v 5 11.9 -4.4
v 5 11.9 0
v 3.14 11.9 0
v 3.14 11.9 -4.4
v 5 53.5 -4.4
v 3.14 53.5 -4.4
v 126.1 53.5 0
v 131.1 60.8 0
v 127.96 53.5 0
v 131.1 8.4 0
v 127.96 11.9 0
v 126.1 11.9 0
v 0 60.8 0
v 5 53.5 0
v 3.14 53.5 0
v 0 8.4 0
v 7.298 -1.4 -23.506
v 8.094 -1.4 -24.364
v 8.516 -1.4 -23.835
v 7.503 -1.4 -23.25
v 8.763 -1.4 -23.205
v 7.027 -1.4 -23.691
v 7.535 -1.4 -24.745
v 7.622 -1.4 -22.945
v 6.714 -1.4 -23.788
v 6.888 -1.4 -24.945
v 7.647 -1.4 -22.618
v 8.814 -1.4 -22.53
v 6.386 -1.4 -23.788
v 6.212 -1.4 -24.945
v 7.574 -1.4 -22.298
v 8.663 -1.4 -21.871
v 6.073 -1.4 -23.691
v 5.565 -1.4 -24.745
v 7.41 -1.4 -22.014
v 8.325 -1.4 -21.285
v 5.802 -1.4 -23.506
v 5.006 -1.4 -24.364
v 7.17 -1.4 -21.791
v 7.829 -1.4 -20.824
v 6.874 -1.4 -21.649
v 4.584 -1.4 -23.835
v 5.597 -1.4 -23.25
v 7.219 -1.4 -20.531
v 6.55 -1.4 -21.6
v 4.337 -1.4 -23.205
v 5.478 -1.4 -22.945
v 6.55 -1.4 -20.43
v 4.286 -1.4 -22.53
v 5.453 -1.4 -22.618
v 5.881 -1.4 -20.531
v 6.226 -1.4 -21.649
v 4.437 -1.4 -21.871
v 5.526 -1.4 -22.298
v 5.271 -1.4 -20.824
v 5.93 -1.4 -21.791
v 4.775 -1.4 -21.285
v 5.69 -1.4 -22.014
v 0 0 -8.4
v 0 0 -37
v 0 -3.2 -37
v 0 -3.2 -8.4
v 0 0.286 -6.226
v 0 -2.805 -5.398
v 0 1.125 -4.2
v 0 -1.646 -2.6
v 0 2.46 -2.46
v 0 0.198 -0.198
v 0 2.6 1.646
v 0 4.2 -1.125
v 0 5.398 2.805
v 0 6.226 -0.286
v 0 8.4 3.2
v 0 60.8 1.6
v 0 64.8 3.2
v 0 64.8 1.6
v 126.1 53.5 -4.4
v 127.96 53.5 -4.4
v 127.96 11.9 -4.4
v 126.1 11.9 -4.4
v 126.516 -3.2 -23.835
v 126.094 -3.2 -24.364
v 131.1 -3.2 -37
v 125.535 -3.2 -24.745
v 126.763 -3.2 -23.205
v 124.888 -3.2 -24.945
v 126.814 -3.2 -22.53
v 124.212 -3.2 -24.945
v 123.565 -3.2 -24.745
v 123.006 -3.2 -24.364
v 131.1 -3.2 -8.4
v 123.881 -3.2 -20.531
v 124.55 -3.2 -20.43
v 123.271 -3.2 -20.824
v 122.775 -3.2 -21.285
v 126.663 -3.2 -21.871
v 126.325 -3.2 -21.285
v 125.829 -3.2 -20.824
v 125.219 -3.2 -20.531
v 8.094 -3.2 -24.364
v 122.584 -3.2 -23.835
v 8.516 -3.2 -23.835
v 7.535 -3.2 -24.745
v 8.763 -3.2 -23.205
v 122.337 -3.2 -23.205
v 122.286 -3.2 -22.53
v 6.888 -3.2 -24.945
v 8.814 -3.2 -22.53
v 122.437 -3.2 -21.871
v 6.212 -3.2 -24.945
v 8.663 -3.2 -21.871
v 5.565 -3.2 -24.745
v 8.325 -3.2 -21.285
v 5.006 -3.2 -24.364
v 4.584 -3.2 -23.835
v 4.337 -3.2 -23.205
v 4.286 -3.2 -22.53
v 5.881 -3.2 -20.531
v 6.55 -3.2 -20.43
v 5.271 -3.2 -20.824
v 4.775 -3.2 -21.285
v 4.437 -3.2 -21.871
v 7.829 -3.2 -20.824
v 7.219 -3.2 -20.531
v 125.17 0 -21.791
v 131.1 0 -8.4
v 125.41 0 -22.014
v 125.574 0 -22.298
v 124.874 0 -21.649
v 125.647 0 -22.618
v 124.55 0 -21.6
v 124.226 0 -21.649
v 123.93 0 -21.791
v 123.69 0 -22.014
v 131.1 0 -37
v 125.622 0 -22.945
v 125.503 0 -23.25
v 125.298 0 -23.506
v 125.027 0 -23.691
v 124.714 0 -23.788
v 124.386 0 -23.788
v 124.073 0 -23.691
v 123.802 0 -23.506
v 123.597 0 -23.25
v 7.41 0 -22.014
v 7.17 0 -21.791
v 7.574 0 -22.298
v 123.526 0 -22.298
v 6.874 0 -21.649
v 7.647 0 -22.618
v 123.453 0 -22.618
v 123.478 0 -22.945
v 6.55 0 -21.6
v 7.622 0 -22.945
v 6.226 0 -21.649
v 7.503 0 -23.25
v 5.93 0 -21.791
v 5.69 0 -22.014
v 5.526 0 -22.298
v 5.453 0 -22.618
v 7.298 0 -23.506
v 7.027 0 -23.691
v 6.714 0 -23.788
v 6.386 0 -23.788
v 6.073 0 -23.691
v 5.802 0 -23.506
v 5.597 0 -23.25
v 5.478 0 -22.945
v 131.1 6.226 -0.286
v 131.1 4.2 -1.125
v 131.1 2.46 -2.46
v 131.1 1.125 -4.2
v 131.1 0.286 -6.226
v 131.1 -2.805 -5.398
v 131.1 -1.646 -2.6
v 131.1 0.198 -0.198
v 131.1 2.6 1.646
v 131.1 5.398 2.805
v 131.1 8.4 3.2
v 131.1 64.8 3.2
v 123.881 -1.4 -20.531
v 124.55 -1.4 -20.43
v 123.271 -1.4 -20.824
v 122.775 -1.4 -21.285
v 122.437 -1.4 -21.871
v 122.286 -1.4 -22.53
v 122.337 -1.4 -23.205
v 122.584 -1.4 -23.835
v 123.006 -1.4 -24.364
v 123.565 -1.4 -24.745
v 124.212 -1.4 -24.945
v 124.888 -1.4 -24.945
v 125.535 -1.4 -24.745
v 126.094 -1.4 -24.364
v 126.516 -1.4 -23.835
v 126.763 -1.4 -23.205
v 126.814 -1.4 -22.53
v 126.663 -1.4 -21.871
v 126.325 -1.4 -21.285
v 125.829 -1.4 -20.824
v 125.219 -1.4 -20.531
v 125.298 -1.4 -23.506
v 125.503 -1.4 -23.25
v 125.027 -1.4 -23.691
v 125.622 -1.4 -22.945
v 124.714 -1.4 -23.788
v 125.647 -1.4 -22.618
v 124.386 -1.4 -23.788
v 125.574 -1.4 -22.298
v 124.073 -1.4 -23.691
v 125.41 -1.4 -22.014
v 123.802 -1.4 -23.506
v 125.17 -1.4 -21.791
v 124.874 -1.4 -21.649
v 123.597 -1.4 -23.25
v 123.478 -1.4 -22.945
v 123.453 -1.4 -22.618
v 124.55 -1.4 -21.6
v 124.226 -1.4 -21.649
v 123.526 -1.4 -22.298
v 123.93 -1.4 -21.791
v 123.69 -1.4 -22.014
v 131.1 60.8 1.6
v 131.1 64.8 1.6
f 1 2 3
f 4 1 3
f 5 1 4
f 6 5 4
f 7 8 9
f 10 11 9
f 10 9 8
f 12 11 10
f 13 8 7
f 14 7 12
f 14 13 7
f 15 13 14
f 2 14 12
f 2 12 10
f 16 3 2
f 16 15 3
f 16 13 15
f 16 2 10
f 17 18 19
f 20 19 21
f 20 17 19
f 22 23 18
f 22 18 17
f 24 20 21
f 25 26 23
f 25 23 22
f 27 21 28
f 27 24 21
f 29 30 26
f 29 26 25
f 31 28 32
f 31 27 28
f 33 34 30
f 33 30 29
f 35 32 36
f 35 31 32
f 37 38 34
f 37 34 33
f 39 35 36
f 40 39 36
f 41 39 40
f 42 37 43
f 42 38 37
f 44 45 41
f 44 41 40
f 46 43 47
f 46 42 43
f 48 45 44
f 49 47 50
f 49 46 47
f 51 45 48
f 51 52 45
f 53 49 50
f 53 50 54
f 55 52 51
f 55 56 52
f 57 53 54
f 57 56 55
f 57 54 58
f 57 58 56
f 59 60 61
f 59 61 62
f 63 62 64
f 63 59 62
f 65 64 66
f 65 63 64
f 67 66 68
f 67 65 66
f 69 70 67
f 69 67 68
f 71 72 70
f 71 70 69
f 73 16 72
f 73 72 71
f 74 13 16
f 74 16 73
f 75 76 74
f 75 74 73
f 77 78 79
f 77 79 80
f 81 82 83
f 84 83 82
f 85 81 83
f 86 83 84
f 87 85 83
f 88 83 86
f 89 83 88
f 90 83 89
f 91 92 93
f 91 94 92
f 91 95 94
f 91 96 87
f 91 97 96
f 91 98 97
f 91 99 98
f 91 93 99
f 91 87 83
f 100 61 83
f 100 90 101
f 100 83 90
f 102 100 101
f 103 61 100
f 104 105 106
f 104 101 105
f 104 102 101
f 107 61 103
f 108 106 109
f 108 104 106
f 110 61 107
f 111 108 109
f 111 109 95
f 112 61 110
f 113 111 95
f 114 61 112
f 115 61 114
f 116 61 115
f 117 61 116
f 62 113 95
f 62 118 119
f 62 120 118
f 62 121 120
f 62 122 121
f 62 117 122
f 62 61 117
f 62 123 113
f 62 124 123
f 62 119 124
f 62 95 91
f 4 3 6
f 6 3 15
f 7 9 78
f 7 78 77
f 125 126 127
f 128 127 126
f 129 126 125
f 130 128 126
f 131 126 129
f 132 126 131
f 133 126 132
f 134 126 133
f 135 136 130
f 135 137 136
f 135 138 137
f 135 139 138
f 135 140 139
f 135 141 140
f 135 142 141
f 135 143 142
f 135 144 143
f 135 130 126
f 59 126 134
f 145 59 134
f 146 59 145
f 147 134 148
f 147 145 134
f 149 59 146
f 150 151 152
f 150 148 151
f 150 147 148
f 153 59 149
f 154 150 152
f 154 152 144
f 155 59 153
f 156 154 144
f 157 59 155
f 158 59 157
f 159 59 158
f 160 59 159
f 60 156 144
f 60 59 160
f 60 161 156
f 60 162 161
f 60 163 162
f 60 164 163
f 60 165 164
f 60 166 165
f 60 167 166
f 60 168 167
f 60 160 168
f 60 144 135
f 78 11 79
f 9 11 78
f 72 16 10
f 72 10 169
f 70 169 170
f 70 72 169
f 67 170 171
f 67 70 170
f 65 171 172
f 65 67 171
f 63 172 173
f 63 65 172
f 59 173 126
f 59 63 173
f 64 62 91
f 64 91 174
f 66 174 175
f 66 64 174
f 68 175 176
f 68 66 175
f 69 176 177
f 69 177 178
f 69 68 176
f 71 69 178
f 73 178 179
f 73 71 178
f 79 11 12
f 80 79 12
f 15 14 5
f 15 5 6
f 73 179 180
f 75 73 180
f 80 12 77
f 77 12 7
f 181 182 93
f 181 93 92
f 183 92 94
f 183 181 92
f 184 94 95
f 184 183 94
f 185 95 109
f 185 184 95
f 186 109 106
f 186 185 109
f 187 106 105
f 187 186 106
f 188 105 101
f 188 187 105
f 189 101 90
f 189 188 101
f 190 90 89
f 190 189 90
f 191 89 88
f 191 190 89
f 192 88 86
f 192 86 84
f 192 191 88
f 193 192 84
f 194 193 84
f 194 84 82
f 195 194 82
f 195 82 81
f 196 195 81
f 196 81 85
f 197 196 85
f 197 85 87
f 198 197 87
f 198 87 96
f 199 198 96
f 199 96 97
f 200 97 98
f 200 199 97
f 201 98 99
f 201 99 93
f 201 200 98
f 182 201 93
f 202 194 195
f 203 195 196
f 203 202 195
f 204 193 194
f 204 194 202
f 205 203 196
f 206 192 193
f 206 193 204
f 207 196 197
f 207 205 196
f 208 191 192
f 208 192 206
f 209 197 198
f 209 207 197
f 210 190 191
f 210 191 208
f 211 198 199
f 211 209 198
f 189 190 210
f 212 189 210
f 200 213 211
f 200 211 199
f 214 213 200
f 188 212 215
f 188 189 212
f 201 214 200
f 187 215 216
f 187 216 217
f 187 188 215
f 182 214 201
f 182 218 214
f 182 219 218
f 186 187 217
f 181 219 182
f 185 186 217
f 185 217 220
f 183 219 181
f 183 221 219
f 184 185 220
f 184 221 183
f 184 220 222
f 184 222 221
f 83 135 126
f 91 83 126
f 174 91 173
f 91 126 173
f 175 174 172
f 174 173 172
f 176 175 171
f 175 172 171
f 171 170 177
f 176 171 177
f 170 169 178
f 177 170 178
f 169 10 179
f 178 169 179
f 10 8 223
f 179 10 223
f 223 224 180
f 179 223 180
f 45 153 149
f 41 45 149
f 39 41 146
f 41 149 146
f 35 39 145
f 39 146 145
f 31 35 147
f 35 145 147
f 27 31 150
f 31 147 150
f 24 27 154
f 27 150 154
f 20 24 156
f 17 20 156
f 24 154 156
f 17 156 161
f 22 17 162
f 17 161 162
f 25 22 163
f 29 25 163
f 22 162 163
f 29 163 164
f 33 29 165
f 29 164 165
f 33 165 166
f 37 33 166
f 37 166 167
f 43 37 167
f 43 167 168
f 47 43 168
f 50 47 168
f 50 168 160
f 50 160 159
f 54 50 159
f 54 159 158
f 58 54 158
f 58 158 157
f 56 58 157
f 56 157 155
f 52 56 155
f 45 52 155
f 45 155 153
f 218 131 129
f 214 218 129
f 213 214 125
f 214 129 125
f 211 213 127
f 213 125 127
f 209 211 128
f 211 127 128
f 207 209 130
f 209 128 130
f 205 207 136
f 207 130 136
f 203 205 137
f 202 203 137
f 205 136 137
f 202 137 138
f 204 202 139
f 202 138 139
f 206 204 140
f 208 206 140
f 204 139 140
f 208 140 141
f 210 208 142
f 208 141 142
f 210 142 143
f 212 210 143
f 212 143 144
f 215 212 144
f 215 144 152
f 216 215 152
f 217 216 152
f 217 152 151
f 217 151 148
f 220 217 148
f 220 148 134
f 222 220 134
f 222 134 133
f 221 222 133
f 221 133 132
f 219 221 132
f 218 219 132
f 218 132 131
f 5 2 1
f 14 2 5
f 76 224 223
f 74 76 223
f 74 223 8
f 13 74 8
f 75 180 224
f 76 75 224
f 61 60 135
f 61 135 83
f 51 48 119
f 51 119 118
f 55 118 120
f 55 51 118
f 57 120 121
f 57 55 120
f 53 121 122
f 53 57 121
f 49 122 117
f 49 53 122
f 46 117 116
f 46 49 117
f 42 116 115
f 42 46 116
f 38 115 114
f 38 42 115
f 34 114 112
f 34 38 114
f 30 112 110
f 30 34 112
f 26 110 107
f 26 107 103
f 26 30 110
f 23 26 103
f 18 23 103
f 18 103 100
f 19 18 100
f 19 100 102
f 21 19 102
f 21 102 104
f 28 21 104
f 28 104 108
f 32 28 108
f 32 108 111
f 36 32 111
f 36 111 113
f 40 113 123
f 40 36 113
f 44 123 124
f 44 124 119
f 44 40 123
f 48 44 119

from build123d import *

# Parameters (mm, degrees)
SALIENTE_EXTRUIR1_DEPTH    = 131.1
CROQUIS3_R                 = 1.1
CORTAR_EXTRUIR1_DEPTH      = 289.575068223
CROQUIS4_R                 = 10.7
CROQUIS4_R_2               = 5.07
CROQUIS4_W                 = 121.1
CROQUIS4_H                 = 75.8
CROQUIS4_W_2               = 1.6
CROQUIS4_H_2               = 10
CROQUIS4_W_3               = 10
CROQUIS4_H_3               = 10.6
CORTAR_EXTRUIR2_DEPTH      = 287.189954401
CROQUIS7_W                 = 1.36
CROQUIS7_H                 = 98
CROQUIS7_W_2               = 1.86
CROQUIS7_H_2               = 41.6
SALIENTE_EXTRUIR2_DEPTH    = 4.4
CROQUIS8_R                 = 2.27
CORTAR_EXTRUIR3_DEPTH      = 1.8
CORTAR_EXTRUIR4_START      = -1.8
CROQUIS9_R                 = 2.27
CORTAR_EXTRUIR4_DEPTH      = 1.8
CROQUIS10_R                = 11.9
CROQUIS10_R_2              = 10.7
CROQUIS10_W                = 12.4
CROQUIS10_H                = 13
CROQUIS10_W_2              = 10
CROQUIS10_H_2              = 10.6
SALIENTE_EXTRUIR4_DEPTH    = 8.6
REDONDEO2_R                = 1.28
CORTAR_EXTRUIR5_REACH      = 292.482
CORTAR_EXTRUIR5_END_RADIUS = 10.7
CROQUIS11_W                = 4
CROQUIS11_H                = 14
SALIENTE_EXTRUIR6_START    = 1
CROQUIS13_W                = 12.4
CROQUIS13_H                = 13
SALIENTE_EXTRUIR6_DEPTH    = 1
CROQUIS14_R                = 2.8
CROQUIS14_R_2              = 1.5
SALIENTE_EXTRUIR7_DEPTH    = 8.4
REDONDEO3_R                = 1.28
CROQUIS17_W                = 4.4
CROQUIS17_H                = 0.4
CORTAR_EXTRUIR6_DEPTH      = 285.106479335
REDONDEO4_R                = 1.6
CROQUIS19_R                = 1.12
SALIENTE_EXTRUIR8_DEPTH    = 8.6
REDONDEO5_R                = 1
CORTAR_EXTRUIR8_START      = -1.86
CROQUIS21_W                = 0.6
CROQUIS21_H                = 26
CORTAR_EXTRUIR8_DEPTH      = 1.86
CROQUIS23_W                = 121.1
CROQUIS23_H                = 0.1
CORTAR_EXTRUIR9_DEPTH      = 287.189954401
CORTAR_EXTRUIR10_DEPTH     = 286.758027009


with BuildPart() as part:
    # Croquis2 → Saliente-Extruir1 (new body)
    with BuildSketch(Plane(origin=(0, 0, 0), x_dir=(0, 0, -1), z_dir=(1, 0, 0))):
        with BuildLine():
            Line((37, 0), (37, -3.2))
            Line((37, -3.2), (8.4, -3.2))
            ThreePointArc((8.4, -3.2), (0.197561338, 0.197561338), (-3.2, 8.4))
            Line((-3.2, 8.4), (-3.2, 239.6))
            ThreePointArc((-3.2, 239.6), (0.197561338, 247.802438662), (8.4, 251.2))
            Line((8.4, 251.2), (37, 251.2))
            Line((37, 251.2), (37, 248))
            Line((37, 248), (8.4, 248))
            ThreePointArc((8.4, 248), (2.460303038, 245.539696962), (0, 239.6))
            Line((0, 239.6), (0, 8.4))
            ThreePointArc((0, 8.4), (2.460303038, 2.460303038), (8.4, 0))
            Line((8.4, 0), (37, 0))
        make_face()
    extrude(amount=SALIENTE_EXTRUIR1_DEPTH)

    # Croquis3 → Cortar-Extruir1 (cut, through all)
    with BuildSketch(Plane(origin=(0, 251.2, 0), x_dir=(1, 0, 0), z_dir=(0, 1, 0))):
        with Locations(Location((6.55, 22.7, 0), (0, 0, 270))):
            Circle(CROQUIS3_R)
        with Locations(Location((124.55, 22.7, 0), (0, 0, 270))):
            Circle(CROQUIS3_R)
    extrude(amount=-CORTAR_EXTRUIR1_DEPTH, mode=Mode.SUBTRACT)

    # Croquis4 → Cortar-Extruir2 (cut, through all)
    with BuildSketch(Plane.XY.offset(3.2)):
        with Locations((17, 79.6)):
            Circle(CROQUIS4_R)
        with Locations((65.55, 113.5)):
            Circle(CROQUIS4_R_2)
        with Locations((65.55, 196.1)):
            Rectangle(CROQUIS4_W, CROQUIS4_H)
        with Locations((9.2, 112)):
            Rectangle(CROQUIS4_W_2, CROQUIS4_H_2)
        with Locations((45.7, 91.4)):
            Rectangle(CROQUIS4_W_3, CROQUIS4_H_3)
        with Locations((5.8, 112)):
            Rectangle(CROQUIS4_W_2, CROQUIS4_H_2)
        with Locations((12.6, 112)):
            Rectangle(CROQUIS4_W_2, CROQUIS4_H_2)
        with Locations((16, 112)):
            Rectangle(CROQUIS4_W_2, CROQUIS4_H_2)
        with Locations((19.4, 112)):
            Rectangle(CROQUIS4_W_2, CROQUIS4_H_2)
        with Locations((22.8, 112)):
            Rectangle(CROQUIS4_W_2, CROQUIS4_H_2)
        with Locations((26.2, 112)):
            Rectangle(CROQUIS4_W_2, CROQUIS4_H_2)
        with Locations((29.6, 112)):
            Rectangle(CROQUIS4_W_2, CROQUIS4_H_2)
        with Locations((33, 112)):
            Rectangle(CROQUIS4_W_2, CROQUIS4_H_2)
        with Locations((36.4, 112)):
            Rectangle(CROQUIS4_W_2, CROQUIS4_H_2)
        with Locations((39.8, 112)):
            Rectangle(CROQUIS4_W_2, CROQUIS4_H_2)
        with Locations((43.2, 112)):
            Rectangle(CROQUIS4_W_2, CROQUIS4_H_2)
        with Locations((46.6, 112)):
            Rectangle(CROQUIS4_W_2, CROQUIS4_H_2)
        with Locations((50, 112)):
            Rectangle(CROQUIS4_W_2, CROQUIS4_H_2)
    extrude(amount=-CORTAR_EXTRUIR2_DEPTH, mode=Mode.SUBTRACT)

    # Croquis7 → Saliente-Extruir2 (add)
    with BuildSketch(Plane(origin=(0, 0, 0), x_dir=(-1, 0, 0), z_dir=(0, 0, -1))):
        Polygon((-127.46, 125.3), (-127.96, 125.3), (-127.96, 66.3), (-127.46, 66.3), (-126.1, 66.3), (-126.1, 125.3), align=None)
        with Locations((-126.78, 185)):
            Rectangle(CROQUIS7_W, CROQUIS7_H)
        with Locations((-4.32, 185)):
            Rectangle(CROQUIS7_W, CROQUIS7_H)
        Polygon((-3.64, 125.3), (-5, 125.3), (-5, 66.3), (-3.64, 66.3), (-3.14, 66.3), (-3.14, 125.3), align=None)
        with Locations((-127.03, 32.7)):
            Rectangle(CROQUIS7_W_2, CROQUIS7_H_2)
        with Locations((-4.07, 32.7)):
            Rectangle(CROQUIS7_W_2, CROQUIS7_H_2)
    extrude(amount=SALIENTE_EXTRUIR2_DEPTH)

    # Croquis8 → Cortar-Extruir3 (cut)
    with BuildSketch(Plane(origin=(0, 251.2, 0), x_dir=(1, 0, 0), z_dir=(0, 1, 0))):
        with Locations(Location((6.55, 22.7, 0), (0, 0, 270))):
            Circle(CROQUIS8_R)
        with Locations(Location((124.55, 22.7, 0), (0, 0, 270))):
            Circle(CROQUIS8_R)
    extrude(amount=-CORTAR_EXTRUIR3_DEPTH, mode=Mode.SUBTRACT)

    # Croquis9 → Cortar-Extruir4 (cut)
    with BuildSketch(Plane.XZ.offset(3.2).offset(CORTAR_EXTRUIR4_START)):
        with Locations(Location((124.55, -22.7, 0), (0, 0, 90))):
            Circle(CROQUIS9_R)
        with Locations(Location((6.55, -22.7, 0), (0, 0, 90))):
            Circle(CROQUIS9_R)
    extrude(amount=CORTAR_EXTRUIR4_DEPTH, mode=Mode.SUBTRACT)

    # Croquis10 → Saliente-Extruir4 (add)
    # profile 1 of 2: a face of its own
    with BuildSketch(Plane(origin=(0, 0, 0), x_dir=(-1, 0, 0), z_dir=(0, 0, -1))):
        with Locations(Location((-17, 79.6, 0), (0, 0, 180))):
            Circle(CROQUIS10_R)
        with Locations(Location((-17, 79.6, 0), (0, 0, 180))):
            Circle(CROQUIS10_R_2, mode=Mode.SUBTRACT)
    # profile 2 of 2: a face of its own
    with BuildSketch(Plane(origin=(0, 0, 0), x_dir=(-1, 0, 0), z_dir=(0, 0, -1))):
        with Locations((-45.7, 91.4)):
            Rectangle(CROQUIS10_W, CROQUIS10_H)
        with Locations((-45.7, 91.4)):
            Rectangle(CROQUIS10_W_2, CROQUIS10_H_2, mode=Mode.SUBTRACT)
    extrude(amount=SALIENTE_EXTRUIR4_DEPTH)

    # Redondeo2
    redondeo2_edges = [part.edges().sort_by_distance(p)[0] for p in [
        (40.7, 86.1, -2.7),
        (40.7, 96.7, -2.7),
        (50.7, 96.7, -2.7),
        (50.7, 86.1, -2.7),
    ]]
    fillet(redondeo2_edges, radius=REDONDEO2_R)

    # Cortar-Extruir5: up to this cylinder (the profile starts outside it)
    cortar_extruir5_end = Plane(origin=(17, 79.6, -4.3), z_dir=(0, 0, 1)) * Cylinder(CORTAR_EXTRUIR5_END_RADIUS, 607.364, mode=Mode.PRIVATE)
    # Croquis11 → Cortar-Extruir5 (cut, up to the surface)
    with BuildSketch(Plane.ZY.offset(10), mode=Mode.PRIVATE) as cortar_extruir5_sk1:
        with Locations((-4.3, 79.6)):
            Rectangle(CROQUIS11_W, CROQUIS11_H)
    cortar_extruir5_tool1 = extrude(cortar_extruir5_sk1.sketch, amount=-CORTAR_EXTRUIR5_REACH, mode=Mode.PRIVATE) - cortar_extruir5_end
    add(cortar_extruir5_tool1.solids().sort_by_distance((-10, 79.6, -4.3))[0], mode=Mode.SUBTRACT)

    # Croquis13 → Saliente-Extruir6 (add)
    with BuildSketch(Plane(origin=(0, 0, -8.6), x_dir=(-1, 0, 0), z_dir=(0, 0, -1)).offset(SALIENTE_EXTRUIR6_START)):
        with Locations((-45.7, 91.4)):
            Rectangle(CROQUIS13_W, CROQUIS13_H)
        with BuildLine():
            ThreePointArc((-49.42, 86.1), (-50.32509668, 86.47490332), (-50.7, 87.38))
            Line((-50.7, 87.38), (-50.7, 95.42))
            ThreePointArc((-50.7, 95.42), (-50.32509668, 96.32509668), (-49.42, 96.7))
            Line((-49.42, 96.7), (-41.98, 96.7))
            ThreePointArc((-41.98, 96.7), (-41.07490332, 96.32509668), (-40.7, 95.42))
            Line((-40.7, 95.42), (-40.7, 87.38))
            ThreePointArc((-40.7, 87.38), (-41.07490332, 86.47490332), (-41.98, 86.1))
            Line((-41.98, 86.1), (-49.42, 86.1))
        make_face(mode=Mode.SUBTRACT)
    extrude(amount=-SALIENTE_EXTRUIR6_DEPTH)

    # Croquis14 → Saliente-Extruir7 (add)
    with BuildSketch(Plane(origin=(0, 0, 0), x_dir=(-1, 0, 0), z_dir=(0, 0, -1))):
        with Locations(Location((-65.55, 88.8, 0), (0, 0, 180))):
            Circle(CROQUIS14_R)
        with Locations((-65.55, 88.8)):
            Circle(CROQUIS14_R_2, mode=Mode.SUBTRACT)
    extrude(amount=SALIENTE_EXTRUIR7_DEPTH)

    # Redondeo3
    redondeo3_edges = [part.edges().sort_by_distance(p)[0] for p in [
        (62.75, 88.8, 0),
    ]]
    fillet(redondeo3_edges, radius=REDONDEO3_R)

    # Croquis17 → Cortar-Extruir6 (cut, through all)
    with BuildSketch(Plane(origin=(127.46, 0, 0), x_dir=(0, 0, -1), z_dir=(1, 0, 0))):
        with Locations((2.2, 233.8)):
            Rectangle(CROQUIS17_W, CROQUIS17_H)
    extrude(amount=-CORTAR_EXTRUIR6_DEPTH, mode=Mode.SUBTRACT)

    # Redondeo4
    redondeo4_edges = [part.edges().sort_by_distance(p)[0] for p in [
        (51.9, 91.4, 0),
        (39.5, 91.4, 0),
    ]]
    fillet(redondeo4_edges, radius=REDONDEO4_R)

    # Croquis19 → Saliente-Extruir8 (add)
    with BuildSketch(Plane(origin=(0, 0, 0), x_dir=(-1, 0, 0), z_dir=(0, 0, -1))):
        with Locations((-17, 91.5)):
            Circle(CROQUIS19_R)
        with Locations((-17, 67.7)):
            Circle(CROQUIS19_R)
    extrude(amount=SALIENTE_EXTRUIR8_DEPTH)

    # Redondeo5
    redondeo5_edges = [part.edges().sort_by_distance(p)[0] for p in [
        (28.9, 79.6, 0),
    ]]
    fillet(redondeo5_edges, radius=REDONDEO5_R)

    # Croquis21 → Cortar-Extruir8 (cut)
    with BuildSketch(Plane(origin=(127.96, 0, 0), x_dir=(0, 0, -1), z_dir=(1, 0, 0)).offset(CORTAR_EXTRUIR8_START)):
        with Locations((4.1, 79.3)):
            Rectangle(CROQUIS21_W, CROQUIS21_H)
    extrude(amount=CORTAR_EXTRUIR8_DEPTH, mode=Mode.SUBTRACT)

    # Croquis23 → Cortar-Extruir9 (cut, through all)
    with BuildSketch(Plane.XY.offset(3.2)):
        with Locations((65.55, 158.15)):
            Rectangle(CROQUIS23_W, CROQUIS23_H)
    extrude(amount=-CORTAR_EXTRUIR9_DEPTH, mode=Mode.SUBTRACT)

    # Croquis24 → Cortar-Extruir10 (cut, through all)
    with BuildSketch(Plane(origin=(131.1, 0, 0), x_dir=(0, 0, -1), z_dir=(1, 0, 0))):
        with BuildLine():
            Line((37, 60.8), (37, 248))
            Line((37, 248), (8.4, 248))
            ThreePointArc((8.4, 248), (2.460303038, 245.539696962), (0, 239.6))
            Line((0, 239.6), (0, 60.8))
            Line((0, 60.8), (37, 60.8))
        make_face()
        with BuildLine():
            Line((37, 248), (37, 251.2))
            Line((37, 251.2), (8.4, 251.2))
            ThreePointArc((8.4, 251.2), (0.197561338, 247.802438662), (-3.2, 239.6))
            Line((-3.2, 239.6), (-3.2, 64.8))
            Line((-3.2, 64.8), (-1.6, 64.8))
            Line((-1.6, 64.8), (-1.6, 60.8))
            Line((-1.6, 60.8), (0, 60.8))
            Line((0, 60.8), (0, 239.6))
            ThreePointArc((0, 239.6), (2.460303038, 245.539696962), (8.4, 248))
            Line((8.4, 248), (37, 248))
        make_face()
    extrude(amount=-CORTAR_EXTRUIR10_DEPTH, mode=Mode.SUBTRACT)


solid = part.part
